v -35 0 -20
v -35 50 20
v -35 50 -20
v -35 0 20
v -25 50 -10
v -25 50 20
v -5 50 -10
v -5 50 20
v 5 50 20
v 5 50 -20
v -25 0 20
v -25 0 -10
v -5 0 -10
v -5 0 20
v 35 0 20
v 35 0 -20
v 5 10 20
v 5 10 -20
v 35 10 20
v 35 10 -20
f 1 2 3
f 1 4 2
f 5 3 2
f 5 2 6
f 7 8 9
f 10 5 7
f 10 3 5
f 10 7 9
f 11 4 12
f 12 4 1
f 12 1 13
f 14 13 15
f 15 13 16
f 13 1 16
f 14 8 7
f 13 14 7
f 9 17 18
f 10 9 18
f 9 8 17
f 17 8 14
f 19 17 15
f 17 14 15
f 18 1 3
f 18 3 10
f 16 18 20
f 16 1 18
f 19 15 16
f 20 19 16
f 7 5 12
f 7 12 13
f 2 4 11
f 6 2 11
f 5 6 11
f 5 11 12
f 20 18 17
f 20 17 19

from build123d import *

# Parameters (mm, degrees)
SKETCH1_W           = 70
SKETCH1_H           = 40
BOSS_EXTRUDE1_DEPTH = 10
SKETCH2_W           = 40
SKETCH2_H           = 40
BOSS_EXTRUDE2_DEPTH = 40
SKETCH3_W           = 20
SKETCH3_H           = 30
CUT_EXTRUDE1_DEPTH  = 65.226162893


with BuildPart() as part:
    # Sketch1 → Boss-Extrude1 (new body)
    with BuildSketch(Plane(origin=(0, 0, 0), x_dir=(1, 0, 0), z_dir=(0, 1, 0))):
        Rectangle(SKETCH1_W, SKETCH1_H)
    extrude(amount=BOSS_EXTRUDE1_DEPTH)

    # Sketch2 → Boss-Extrude2 (add)
    with BuildSketch(Plane(origin=(0, 10, 0), x_dir=(1, 0, 0), z_dir=(0, 1, 0))):
        with Locations((-15, 0)):
            Rectangle(SKETCH2_W, SKETCH2_H)
    extrude(amount=BOSS_EXTRUDE2_DEPTH)

    # Sketch3 → Cut-Extrude1 (cut, through all)
    with BuildSketch(Plane(origin=(0, 50, 0), x_dir=(1, 0, 0), z_dir=(0, 1, 0))):
        with Locations((-15, -5)):
            Rectangle(SKETCH3_W, SKETCH3_H)
    extrude(amount=-CUT_EXTRUDE1_DEPTH, mode=Mode.SUBTRACT)


solid = part.part
